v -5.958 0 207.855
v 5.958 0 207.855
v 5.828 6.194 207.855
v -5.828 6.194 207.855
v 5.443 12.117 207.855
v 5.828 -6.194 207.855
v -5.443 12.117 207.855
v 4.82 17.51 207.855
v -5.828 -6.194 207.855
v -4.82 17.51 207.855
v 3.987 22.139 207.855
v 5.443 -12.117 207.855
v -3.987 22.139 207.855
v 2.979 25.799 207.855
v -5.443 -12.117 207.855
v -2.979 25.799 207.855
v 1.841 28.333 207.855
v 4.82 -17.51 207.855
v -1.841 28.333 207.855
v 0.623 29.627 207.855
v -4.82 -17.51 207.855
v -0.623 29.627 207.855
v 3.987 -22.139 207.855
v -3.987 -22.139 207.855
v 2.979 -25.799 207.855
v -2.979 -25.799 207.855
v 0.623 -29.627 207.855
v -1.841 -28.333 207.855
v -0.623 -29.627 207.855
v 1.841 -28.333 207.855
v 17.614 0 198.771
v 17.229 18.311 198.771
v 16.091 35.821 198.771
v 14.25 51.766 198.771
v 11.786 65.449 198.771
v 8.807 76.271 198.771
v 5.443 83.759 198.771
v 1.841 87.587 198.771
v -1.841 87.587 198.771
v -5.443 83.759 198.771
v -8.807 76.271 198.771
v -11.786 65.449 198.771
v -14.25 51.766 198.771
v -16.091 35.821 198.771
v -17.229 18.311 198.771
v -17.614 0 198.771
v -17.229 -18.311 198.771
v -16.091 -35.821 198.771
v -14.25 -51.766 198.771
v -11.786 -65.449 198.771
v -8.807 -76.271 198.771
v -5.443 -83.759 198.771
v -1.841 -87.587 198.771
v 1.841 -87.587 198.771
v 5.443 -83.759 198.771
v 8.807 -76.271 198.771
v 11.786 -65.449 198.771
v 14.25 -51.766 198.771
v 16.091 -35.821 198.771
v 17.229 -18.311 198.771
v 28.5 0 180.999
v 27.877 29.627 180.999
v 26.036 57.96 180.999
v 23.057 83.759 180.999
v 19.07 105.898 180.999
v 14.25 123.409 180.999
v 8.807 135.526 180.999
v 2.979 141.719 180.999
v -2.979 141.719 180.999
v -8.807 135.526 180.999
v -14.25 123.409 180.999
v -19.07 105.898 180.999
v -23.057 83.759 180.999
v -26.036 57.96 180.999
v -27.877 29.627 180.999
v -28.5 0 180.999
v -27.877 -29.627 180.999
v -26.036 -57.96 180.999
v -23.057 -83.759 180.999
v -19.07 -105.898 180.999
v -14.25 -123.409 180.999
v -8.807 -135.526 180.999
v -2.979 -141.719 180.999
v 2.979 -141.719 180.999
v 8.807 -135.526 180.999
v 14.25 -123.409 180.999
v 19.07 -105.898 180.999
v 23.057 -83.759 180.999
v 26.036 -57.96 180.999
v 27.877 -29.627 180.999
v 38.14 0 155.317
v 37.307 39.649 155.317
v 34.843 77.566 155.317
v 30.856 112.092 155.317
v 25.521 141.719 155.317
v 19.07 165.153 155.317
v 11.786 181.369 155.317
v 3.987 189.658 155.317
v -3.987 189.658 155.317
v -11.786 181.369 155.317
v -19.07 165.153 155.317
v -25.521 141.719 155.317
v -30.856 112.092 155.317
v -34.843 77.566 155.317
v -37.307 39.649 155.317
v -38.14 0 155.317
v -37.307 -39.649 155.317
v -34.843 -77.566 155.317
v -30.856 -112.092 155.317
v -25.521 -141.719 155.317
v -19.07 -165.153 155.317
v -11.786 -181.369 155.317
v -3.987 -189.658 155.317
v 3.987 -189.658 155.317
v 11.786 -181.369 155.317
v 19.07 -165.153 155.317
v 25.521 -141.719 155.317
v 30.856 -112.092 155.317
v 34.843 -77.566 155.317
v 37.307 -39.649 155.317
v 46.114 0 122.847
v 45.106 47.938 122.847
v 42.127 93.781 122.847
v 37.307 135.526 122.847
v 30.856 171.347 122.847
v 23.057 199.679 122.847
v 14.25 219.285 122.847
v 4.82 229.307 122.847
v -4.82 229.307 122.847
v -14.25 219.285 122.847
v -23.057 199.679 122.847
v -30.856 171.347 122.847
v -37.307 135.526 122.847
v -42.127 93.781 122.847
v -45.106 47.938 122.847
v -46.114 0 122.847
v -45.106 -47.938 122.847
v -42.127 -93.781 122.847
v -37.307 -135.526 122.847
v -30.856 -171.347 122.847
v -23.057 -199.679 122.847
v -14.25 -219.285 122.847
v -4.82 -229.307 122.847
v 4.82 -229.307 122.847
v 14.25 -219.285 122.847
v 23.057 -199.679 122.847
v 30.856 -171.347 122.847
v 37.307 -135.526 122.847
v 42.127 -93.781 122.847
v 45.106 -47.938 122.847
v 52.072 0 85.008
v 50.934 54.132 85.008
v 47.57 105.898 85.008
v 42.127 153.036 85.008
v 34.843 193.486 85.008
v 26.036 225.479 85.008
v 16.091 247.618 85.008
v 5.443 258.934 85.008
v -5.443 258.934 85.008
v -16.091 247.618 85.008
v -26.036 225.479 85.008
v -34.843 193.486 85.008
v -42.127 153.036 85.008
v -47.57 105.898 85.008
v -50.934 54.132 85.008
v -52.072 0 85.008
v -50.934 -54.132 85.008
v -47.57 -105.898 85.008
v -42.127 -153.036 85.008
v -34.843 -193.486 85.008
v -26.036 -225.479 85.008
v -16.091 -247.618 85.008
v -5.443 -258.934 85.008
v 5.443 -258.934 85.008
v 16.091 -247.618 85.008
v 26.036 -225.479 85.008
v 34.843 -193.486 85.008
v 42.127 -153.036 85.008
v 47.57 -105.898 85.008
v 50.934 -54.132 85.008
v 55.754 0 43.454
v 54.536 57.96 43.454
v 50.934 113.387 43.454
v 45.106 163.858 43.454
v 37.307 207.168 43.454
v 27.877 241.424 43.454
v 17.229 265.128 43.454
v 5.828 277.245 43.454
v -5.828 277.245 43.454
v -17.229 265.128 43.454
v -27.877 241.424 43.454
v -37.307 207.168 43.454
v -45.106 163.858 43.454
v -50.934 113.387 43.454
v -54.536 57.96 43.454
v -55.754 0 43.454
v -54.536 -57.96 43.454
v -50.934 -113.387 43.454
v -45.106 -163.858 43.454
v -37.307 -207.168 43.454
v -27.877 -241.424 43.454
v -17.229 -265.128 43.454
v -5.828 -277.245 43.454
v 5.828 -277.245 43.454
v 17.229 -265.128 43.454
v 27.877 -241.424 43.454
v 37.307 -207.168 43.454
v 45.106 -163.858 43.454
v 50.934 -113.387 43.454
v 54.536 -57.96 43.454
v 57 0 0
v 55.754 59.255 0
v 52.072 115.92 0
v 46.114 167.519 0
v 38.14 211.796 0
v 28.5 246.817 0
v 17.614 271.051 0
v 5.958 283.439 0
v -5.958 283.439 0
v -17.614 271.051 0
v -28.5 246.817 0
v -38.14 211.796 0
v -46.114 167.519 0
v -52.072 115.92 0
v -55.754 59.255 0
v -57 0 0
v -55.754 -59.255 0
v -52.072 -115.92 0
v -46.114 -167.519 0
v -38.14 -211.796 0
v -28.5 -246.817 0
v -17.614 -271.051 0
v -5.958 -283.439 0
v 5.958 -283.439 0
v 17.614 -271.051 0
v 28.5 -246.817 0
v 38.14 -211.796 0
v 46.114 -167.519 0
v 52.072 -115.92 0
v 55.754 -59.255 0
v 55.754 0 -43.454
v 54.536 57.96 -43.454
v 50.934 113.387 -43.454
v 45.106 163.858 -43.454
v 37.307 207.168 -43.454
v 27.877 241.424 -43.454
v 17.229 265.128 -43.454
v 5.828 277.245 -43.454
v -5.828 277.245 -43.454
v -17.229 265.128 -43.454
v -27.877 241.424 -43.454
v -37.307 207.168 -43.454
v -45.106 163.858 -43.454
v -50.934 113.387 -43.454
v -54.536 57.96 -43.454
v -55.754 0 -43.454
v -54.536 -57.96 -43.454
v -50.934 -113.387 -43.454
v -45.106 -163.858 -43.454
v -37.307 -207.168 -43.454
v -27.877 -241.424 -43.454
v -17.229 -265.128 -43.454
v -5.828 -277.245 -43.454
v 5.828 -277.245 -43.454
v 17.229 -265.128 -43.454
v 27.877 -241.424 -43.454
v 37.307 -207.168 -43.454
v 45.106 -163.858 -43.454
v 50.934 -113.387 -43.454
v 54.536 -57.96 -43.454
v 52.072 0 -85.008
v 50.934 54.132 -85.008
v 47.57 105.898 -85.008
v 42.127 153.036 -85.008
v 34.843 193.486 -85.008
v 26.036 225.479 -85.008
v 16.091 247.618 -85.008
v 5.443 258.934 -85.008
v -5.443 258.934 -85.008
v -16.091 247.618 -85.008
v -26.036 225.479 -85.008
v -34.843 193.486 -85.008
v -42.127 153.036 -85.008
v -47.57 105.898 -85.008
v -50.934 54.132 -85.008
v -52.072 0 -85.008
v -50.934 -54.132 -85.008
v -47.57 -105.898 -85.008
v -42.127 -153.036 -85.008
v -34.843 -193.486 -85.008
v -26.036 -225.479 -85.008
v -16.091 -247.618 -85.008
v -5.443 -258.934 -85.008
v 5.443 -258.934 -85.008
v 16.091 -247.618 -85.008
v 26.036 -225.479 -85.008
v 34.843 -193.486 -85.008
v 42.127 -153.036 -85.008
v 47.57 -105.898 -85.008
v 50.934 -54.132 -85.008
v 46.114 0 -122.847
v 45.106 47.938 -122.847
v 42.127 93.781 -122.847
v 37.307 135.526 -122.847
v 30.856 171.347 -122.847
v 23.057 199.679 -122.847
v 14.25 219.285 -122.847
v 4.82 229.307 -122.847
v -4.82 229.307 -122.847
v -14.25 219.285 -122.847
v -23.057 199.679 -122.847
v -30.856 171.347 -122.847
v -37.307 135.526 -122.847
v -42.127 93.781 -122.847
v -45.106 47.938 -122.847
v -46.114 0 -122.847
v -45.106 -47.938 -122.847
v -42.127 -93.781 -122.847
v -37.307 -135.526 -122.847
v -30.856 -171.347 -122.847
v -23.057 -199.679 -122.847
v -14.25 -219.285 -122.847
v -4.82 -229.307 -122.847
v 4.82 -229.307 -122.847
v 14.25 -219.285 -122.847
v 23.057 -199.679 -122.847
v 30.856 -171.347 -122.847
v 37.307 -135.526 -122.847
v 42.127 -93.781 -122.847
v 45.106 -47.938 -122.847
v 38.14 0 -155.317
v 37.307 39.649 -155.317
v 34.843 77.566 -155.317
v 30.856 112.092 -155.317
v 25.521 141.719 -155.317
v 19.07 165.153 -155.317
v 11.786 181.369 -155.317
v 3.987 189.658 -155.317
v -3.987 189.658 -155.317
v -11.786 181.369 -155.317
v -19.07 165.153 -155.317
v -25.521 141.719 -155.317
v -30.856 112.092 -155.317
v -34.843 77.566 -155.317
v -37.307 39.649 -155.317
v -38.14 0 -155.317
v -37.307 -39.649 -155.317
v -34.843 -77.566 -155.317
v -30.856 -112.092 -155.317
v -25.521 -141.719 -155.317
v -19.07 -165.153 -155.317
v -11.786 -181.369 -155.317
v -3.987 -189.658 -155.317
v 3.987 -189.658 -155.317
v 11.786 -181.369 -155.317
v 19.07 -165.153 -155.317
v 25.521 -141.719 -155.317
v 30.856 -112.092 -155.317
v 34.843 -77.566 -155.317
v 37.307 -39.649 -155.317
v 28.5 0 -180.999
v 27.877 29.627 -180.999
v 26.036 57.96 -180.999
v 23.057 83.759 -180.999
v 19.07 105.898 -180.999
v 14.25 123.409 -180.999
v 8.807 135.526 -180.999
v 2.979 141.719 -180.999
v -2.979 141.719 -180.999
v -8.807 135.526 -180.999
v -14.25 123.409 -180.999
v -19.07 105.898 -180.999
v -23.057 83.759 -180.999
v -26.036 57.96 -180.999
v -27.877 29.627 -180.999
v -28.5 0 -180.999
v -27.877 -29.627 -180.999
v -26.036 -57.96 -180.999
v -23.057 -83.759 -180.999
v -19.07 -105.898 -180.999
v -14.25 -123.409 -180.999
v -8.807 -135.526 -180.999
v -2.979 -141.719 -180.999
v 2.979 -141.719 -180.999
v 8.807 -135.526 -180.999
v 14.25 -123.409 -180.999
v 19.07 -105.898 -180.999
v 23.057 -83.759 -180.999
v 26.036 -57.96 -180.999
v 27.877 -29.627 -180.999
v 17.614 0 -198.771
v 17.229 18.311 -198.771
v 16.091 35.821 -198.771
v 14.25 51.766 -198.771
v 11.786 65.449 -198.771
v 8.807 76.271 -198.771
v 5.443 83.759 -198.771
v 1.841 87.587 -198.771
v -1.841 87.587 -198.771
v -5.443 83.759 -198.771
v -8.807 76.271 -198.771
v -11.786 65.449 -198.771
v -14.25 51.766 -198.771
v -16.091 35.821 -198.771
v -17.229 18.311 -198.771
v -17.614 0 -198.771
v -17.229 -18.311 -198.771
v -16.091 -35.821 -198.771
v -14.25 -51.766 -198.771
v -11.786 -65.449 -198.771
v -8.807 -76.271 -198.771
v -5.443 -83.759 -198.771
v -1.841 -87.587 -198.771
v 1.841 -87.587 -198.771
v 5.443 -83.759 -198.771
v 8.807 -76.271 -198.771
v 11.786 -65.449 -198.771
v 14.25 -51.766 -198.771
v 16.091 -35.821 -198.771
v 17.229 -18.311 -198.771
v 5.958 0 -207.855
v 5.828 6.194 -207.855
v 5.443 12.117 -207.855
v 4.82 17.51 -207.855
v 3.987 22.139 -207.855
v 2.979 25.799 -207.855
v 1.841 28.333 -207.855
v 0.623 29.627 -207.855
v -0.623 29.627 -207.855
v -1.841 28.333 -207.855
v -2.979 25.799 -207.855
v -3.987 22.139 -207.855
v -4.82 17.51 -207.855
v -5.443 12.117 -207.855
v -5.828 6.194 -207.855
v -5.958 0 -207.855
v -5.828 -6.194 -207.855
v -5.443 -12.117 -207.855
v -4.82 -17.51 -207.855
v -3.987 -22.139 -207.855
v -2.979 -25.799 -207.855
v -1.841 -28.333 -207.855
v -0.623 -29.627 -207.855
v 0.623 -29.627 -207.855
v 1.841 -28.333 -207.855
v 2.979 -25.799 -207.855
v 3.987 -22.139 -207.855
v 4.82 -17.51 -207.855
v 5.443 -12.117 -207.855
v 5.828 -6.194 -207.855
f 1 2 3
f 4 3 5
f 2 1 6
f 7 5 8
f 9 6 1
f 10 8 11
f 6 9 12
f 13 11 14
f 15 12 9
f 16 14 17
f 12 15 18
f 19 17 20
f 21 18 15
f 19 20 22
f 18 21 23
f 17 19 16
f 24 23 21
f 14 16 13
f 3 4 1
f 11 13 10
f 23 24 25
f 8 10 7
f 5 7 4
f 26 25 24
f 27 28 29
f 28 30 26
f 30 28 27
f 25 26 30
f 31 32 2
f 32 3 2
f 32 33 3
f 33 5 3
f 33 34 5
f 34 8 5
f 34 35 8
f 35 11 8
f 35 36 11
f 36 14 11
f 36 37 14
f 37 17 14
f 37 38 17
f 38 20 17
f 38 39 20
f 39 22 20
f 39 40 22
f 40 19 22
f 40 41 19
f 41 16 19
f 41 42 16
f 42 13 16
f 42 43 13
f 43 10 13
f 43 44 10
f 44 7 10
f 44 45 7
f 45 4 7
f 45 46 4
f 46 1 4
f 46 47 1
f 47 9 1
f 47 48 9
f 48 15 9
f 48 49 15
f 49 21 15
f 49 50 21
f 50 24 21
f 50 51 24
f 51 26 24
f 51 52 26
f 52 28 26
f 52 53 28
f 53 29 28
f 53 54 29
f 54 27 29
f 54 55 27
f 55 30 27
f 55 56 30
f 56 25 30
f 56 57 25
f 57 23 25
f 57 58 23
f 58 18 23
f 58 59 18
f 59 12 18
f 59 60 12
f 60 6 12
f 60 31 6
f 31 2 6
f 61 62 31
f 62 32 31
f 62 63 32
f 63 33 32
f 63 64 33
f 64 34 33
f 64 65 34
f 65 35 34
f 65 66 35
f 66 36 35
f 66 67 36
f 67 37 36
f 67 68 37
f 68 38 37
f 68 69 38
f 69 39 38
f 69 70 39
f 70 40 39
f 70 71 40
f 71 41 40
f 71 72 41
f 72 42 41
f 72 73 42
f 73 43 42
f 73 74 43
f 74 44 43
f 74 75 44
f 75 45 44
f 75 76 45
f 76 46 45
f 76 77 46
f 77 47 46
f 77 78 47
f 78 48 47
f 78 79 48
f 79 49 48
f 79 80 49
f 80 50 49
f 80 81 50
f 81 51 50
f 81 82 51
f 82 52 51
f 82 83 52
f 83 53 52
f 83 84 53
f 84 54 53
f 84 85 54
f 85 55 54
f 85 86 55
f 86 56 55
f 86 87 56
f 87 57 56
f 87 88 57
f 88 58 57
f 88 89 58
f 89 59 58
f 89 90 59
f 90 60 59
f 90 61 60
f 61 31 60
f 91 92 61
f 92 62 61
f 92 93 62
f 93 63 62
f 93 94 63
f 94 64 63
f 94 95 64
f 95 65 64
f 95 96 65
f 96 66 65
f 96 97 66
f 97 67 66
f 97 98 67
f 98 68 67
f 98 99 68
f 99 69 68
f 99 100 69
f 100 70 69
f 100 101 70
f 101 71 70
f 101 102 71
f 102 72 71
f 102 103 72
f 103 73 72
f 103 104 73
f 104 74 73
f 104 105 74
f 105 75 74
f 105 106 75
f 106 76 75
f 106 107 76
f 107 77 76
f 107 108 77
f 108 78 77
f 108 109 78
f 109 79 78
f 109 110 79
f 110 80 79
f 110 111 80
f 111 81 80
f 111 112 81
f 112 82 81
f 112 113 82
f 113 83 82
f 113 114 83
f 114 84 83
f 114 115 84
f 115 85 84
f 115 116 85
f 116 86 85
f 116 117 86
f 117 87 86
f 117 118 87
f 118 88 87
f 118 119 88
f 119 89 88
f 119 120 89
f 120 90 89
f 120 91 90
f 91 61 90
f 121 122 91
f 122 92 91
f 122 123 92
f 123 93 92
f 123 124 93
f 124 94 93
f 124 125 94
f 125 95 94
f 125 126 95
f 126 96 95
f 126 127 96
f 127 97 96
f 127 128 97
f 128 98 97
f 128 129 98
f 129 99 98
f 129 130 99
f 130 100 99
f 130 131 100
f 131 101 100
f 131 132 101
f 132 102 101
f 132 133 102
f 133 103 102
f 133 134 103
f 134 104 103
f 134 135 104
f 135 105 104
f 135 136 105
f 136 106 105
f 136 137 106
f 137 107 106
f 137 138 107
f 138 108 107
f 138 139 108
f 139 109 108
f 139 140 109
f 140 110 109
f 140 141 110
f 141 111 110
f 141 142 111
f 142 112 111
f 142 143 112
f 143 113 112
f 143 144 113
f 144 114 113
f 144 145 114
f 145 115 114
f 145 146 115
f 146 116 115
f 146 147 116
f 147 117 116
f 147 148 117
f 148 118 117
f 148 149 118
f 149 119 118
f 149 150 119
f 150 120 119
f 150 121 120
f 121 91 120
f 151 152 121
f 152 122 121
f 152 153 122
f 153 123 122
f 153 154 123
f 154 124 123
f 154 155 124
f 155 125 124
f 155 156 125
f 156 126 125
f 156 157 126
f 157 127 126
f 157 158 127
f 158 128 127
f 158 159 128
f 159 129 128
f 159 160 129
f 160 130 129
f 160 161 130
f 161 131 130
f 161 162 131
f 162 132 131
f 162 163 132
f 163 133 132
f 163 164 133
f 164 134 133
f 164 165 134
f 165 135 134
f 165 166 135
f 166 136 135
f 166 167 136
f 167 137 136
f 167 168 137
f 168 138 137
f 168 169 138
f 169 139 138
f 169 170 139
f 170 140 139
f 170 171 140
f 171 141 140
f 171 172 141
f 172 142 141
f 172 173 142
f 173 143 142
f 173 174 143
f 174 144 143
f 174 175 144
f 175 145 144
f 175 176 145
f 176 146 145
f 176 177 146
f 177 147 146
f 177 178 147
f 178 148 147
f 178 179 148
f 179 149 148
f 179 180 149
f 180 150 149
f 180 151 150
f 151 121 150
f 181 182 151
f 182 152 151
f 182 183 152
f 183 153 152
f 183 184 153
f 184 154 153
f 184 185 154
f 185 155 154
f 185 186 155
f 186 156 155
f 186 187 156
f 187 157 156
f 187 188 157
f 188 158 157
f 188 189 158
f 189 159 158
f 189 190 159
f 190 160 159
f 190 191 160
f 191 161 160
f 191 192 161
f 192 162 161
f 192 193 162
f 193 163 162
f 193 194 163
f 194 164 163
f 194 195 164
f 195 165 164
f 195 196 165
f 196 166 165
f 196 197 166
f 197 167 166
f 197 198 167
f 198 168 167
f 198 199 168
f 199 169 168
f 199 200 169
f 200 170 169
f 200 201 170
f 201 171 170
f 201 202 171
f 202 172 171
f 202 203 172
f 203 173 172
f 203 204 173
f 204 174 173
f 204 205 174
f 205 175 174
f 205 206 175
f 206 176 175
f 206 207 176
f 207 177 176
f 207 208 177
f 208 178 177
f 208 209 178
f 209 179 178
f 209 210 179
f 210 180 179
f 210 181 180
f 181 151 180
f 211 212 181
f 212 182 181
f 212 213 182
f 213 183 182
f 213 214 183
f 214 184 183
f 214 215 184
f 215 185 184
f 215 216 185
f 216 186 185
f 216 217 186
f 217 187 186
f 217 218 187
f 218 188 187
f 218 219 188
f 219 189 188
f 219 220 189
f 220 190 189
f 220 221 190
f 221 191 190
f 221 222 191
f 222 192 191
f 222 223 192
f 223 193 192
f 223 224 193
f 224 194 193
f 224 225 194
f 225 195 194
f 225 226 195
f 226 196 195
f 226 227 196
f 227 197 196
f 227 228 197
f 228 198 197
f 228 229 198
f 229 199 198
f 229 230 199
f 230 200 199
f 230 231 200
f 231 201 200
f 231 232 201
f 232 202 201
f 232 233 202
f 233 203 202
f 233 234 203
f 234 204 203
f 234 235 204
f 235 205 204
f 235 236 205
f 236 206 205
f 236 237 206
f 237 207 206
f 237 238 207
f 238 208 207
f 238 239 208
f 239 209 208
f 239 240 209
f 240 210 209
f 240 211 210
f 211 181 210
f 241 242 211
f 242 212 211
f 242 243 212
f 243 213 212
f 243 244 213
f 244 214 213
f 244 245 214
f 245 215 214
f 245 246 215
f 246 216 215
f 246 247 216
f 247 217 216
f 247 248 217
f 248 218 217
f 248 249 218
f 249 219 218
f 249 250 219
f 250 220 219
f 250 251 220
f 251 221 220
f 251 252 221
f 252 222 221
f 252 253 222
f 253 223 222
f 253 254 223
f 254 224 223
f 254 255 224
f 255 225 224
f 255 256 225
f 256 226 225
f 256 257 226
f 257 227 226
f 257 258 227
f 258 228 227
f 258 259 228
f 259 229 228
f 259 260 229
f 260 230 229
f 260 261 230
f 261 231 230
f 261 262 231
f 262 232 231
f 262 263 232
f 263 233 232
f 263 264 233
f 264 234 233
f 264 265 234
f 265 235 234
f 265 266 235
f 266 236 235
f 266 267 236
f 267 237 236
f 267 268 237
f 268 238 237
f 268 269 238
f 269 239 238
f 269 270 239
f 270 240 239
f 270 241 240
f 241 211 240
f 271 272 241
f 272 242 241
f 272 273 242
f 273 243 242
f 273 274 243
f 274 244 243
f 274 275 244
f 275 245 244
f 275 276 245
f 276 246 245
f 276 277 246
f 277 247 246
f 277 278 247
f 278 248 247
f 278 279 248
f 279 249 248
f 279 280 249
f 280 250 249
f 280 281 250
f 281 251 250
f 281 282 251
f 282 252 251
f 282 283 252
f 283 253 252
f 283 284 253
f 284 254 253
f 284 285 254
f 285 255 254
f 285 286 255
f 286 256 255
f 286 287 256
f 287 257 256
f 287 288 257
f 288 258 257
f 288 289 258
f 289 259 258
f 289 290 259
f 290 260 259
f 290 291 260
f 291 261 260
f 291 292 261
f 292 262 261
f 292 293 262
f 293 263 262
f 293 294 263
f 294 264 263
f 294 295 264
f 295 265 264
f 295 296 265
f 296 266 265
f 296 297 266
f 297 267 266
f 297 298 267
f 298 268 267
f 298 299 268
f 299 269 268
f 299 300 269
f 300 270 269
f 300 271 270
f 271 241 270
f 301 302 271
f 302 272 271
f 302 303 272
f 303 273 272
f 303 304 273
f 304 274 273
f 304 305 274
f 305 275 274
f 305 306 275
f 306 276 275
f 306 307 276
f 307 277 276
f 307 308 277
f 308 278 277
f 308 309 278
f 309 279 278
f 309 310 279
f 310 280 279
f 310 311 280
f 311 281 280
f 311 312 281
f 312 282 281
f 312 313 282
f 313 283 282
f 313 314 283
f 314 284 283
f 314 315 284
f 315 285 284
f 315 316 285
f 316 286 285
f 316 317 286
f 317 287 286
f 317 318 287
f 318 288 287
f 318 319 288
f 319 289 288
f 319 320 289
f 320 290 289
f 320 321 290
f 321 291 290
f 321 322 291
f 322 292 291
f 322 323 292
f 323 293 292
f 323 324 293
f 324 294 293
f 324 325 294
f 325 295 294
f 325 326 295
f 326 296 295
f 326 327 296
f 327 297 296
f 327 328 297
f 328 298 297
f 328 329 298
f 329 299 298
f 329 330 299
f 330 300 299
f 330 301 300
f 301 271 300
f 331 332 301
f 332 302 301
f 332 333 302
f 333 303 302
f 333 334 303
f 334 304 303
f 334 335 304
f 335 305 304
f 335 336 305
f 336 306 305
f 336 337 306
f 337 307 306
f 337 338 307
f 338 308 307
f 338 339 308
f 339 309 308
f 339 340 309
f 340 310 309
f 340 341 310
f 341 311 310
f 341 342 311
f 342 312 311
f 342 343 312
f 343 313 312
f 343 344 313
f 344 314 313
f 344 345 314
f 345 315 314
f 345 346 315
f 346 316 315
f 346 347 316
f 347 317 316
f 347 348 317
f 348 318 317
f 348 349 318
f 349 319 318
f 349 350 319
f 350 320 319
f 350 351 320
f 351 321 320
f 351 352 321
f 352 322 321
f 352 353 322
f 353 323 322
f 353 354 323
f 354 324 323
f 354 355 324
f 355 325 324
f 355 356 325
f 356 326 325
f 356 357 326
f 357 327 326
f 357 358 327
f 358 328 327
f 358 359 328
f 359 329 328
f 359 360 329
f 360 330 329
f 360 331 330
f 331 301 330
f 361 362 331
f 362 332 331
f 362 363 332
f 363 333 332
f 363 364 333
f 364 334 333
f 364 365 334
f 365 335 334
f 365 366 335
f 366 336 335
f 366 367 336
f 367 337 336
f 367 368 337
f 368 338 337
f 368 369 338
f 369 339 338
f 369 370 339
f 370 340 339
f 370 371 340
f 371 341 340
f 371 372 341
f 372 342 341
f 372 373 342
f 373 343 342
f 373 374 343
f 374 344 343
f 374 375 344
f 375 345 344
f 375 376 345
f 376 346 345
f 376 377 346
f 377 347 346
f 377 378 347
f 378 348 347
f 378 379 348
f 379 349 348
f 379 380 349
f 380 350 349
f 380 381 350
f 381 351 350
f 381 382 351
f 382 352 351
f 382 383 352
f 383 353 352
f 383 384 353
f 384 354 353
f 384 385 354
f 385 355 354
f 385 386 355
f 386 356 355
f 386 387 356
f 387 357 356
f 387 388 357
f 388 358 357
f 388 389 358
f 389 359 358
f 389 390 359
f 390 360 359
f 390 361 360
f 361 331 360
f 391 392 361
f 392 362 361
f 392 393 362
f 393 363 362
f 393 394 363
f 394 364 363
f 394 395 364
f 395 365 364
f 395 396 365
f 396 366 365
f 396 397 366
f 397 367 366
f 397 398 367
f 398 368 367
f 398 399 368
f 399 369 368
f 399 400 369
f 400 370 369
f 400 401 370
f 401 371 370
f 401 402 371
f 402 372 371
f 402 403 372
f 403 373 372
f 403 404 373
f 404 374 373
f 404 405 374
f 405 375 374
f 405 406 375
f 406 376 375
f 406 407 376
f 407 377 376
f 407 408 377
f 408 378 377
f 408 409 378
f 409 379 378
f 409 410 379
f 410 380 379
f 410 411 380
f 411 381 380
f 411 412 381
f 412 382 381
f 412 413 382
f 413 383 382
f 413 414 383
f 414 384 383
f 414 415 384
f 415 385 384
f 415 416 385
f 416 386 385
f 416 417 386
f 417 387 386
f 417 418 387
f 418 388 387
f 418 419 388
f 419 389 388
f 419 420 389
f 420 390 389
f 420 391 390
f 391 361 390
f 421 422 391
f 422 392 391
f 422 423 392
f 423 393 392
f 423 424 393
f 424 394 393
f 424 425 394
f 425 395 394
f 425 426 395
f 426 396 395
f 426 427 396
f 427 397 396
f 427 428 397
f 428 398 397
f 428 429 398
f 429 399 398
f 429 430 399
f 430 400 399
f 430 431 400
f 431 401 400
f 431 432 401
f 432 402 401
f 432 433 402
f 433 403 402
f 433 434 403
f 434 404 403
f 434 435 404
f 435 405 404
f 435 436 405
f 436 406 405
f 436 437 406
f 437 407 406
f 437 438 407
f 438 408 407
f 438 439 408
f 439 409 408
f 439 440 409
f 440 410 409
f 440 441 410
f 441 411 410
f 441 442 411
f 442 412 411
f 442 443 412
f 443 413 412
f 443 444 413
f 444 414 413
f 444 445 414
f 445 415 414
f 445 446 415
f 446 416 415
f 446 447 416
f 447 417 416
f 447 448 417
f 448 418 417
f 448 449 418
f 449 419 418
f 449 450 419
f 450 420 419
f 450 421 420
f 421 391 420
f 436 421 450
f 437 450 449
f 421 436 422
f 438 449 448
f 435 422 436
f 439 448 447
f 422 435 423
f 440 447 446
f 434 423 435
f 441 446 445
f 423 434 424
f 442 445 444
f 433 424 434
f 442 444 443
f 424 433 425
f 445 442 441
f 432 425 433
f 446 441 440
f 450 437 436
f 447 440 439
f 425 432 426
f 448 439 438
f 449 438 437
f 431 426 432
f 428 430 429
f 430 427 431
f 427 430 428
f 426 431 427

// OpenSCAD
// Generated by SolidPython 1.0.1 on 2020-07-29 00:46:45


scale(v = [3, 15, 11]) {
	sphere(r = 19);
}
/***********************************************
*********      SolidPython code:      **********
************************************************
 
# import packages: SolidPython
from solid import *
from solid.utils import *
from itertools import chain, combinations, permutations


class Resize:

    def __init__(self, scad_file):
        self.scad_file = scad_file
        #self.scad_file = import_scad(scad_file)
        # cone/cylinder param:
        self.r1 = 0
        self.r2 = 0
        self.h = 0
        # rectangular prism param:
        self.w = 0
        self.l = 0
        # ellipse param:
        self.r = 0

    # import OpenScad code (file name corresponds to shape)


    # classify shape + parameters
    def assign(self, param1, param2, param3):
        if self.scad_file == 'cone.scad':
            self.r1 = param1
            self.r2 = param2
            self.h = param3
        elif self.scad_file == 'cylinder.scad':
            self.r1 = param1
            self.r2 = param2
            self.h = param3
        elif self.scad_file == 'rectangularPrism.scad':
            self.h = param1
            self.l = param2
            self.w = param3
        else:
            self.r = param1
            self.h = param2

    # resize parameters
    def iterate(self):
        x = range(3, 20, 2)
        i = 1
        if self.scad_file == 'cone.scad':
            tempList = list(permutations(x, 2))
            for temp in tempList:
                param1 = temp[0]
                param2 = temp[1]
                filepath = 'produced_scad_files/' + 'cone' + str(param1) + '_' + str(param2) + '_' + '.scad'
                scad_render_to_file(cylinder(h=param1, r1=param2, r2=0), filepath)

        elif self.scad_file == 'cylinder.scad':
            tempList = list(permutations(x, 3))
            for temp in tempList:
                param1 = temp[0]
                param2 = temp[1]
                filepath = 'produced_scad_files/' + 'cylinder' + str(param1) + '_' + str(param2) + '_' + '.scad'
                scad_render_to_file(cylinder(h=param1, r1=param2, r2=param2), filepath)

        elif self.scad_file == 'rectangularPrism.scad':
            tempList = list(permutations(x, 3))
            for temp in tempList:
                param1 = temp[0]
                param2 = temp[1]
                param3 = temp[2]
                filepath = 'produced_scad_files/' + 'rectangularPrism' + str(param1) + '_' + str(param2) + '_' + str(
                    param3) + '.scad'
                scad_render_to_file(cube(size=(param1, param2, param3)), filepath)

        elif self.scad_file == 'ellipse.scad':
            tempList = list(permutations(x, 4))
            for temp in tempList:
                param1 = temp[0]
                param2 = temp[1]
                param3 = temp[2]
                param4 = temp[3]
                filepath = 'produced_scad_files/' + 'ellipse' + str(param1) + '_' + str(param2) + '_' + str(param3) + '_' + str(param4) + '.scad'
                scad_render_to_file(scale([param1, param2, param3])(sphere(r=param4)), filepath)

    def render_to_scadfile(self):
        scad_render_to_file(scad, 'example.scad') 
 
************************************************/
